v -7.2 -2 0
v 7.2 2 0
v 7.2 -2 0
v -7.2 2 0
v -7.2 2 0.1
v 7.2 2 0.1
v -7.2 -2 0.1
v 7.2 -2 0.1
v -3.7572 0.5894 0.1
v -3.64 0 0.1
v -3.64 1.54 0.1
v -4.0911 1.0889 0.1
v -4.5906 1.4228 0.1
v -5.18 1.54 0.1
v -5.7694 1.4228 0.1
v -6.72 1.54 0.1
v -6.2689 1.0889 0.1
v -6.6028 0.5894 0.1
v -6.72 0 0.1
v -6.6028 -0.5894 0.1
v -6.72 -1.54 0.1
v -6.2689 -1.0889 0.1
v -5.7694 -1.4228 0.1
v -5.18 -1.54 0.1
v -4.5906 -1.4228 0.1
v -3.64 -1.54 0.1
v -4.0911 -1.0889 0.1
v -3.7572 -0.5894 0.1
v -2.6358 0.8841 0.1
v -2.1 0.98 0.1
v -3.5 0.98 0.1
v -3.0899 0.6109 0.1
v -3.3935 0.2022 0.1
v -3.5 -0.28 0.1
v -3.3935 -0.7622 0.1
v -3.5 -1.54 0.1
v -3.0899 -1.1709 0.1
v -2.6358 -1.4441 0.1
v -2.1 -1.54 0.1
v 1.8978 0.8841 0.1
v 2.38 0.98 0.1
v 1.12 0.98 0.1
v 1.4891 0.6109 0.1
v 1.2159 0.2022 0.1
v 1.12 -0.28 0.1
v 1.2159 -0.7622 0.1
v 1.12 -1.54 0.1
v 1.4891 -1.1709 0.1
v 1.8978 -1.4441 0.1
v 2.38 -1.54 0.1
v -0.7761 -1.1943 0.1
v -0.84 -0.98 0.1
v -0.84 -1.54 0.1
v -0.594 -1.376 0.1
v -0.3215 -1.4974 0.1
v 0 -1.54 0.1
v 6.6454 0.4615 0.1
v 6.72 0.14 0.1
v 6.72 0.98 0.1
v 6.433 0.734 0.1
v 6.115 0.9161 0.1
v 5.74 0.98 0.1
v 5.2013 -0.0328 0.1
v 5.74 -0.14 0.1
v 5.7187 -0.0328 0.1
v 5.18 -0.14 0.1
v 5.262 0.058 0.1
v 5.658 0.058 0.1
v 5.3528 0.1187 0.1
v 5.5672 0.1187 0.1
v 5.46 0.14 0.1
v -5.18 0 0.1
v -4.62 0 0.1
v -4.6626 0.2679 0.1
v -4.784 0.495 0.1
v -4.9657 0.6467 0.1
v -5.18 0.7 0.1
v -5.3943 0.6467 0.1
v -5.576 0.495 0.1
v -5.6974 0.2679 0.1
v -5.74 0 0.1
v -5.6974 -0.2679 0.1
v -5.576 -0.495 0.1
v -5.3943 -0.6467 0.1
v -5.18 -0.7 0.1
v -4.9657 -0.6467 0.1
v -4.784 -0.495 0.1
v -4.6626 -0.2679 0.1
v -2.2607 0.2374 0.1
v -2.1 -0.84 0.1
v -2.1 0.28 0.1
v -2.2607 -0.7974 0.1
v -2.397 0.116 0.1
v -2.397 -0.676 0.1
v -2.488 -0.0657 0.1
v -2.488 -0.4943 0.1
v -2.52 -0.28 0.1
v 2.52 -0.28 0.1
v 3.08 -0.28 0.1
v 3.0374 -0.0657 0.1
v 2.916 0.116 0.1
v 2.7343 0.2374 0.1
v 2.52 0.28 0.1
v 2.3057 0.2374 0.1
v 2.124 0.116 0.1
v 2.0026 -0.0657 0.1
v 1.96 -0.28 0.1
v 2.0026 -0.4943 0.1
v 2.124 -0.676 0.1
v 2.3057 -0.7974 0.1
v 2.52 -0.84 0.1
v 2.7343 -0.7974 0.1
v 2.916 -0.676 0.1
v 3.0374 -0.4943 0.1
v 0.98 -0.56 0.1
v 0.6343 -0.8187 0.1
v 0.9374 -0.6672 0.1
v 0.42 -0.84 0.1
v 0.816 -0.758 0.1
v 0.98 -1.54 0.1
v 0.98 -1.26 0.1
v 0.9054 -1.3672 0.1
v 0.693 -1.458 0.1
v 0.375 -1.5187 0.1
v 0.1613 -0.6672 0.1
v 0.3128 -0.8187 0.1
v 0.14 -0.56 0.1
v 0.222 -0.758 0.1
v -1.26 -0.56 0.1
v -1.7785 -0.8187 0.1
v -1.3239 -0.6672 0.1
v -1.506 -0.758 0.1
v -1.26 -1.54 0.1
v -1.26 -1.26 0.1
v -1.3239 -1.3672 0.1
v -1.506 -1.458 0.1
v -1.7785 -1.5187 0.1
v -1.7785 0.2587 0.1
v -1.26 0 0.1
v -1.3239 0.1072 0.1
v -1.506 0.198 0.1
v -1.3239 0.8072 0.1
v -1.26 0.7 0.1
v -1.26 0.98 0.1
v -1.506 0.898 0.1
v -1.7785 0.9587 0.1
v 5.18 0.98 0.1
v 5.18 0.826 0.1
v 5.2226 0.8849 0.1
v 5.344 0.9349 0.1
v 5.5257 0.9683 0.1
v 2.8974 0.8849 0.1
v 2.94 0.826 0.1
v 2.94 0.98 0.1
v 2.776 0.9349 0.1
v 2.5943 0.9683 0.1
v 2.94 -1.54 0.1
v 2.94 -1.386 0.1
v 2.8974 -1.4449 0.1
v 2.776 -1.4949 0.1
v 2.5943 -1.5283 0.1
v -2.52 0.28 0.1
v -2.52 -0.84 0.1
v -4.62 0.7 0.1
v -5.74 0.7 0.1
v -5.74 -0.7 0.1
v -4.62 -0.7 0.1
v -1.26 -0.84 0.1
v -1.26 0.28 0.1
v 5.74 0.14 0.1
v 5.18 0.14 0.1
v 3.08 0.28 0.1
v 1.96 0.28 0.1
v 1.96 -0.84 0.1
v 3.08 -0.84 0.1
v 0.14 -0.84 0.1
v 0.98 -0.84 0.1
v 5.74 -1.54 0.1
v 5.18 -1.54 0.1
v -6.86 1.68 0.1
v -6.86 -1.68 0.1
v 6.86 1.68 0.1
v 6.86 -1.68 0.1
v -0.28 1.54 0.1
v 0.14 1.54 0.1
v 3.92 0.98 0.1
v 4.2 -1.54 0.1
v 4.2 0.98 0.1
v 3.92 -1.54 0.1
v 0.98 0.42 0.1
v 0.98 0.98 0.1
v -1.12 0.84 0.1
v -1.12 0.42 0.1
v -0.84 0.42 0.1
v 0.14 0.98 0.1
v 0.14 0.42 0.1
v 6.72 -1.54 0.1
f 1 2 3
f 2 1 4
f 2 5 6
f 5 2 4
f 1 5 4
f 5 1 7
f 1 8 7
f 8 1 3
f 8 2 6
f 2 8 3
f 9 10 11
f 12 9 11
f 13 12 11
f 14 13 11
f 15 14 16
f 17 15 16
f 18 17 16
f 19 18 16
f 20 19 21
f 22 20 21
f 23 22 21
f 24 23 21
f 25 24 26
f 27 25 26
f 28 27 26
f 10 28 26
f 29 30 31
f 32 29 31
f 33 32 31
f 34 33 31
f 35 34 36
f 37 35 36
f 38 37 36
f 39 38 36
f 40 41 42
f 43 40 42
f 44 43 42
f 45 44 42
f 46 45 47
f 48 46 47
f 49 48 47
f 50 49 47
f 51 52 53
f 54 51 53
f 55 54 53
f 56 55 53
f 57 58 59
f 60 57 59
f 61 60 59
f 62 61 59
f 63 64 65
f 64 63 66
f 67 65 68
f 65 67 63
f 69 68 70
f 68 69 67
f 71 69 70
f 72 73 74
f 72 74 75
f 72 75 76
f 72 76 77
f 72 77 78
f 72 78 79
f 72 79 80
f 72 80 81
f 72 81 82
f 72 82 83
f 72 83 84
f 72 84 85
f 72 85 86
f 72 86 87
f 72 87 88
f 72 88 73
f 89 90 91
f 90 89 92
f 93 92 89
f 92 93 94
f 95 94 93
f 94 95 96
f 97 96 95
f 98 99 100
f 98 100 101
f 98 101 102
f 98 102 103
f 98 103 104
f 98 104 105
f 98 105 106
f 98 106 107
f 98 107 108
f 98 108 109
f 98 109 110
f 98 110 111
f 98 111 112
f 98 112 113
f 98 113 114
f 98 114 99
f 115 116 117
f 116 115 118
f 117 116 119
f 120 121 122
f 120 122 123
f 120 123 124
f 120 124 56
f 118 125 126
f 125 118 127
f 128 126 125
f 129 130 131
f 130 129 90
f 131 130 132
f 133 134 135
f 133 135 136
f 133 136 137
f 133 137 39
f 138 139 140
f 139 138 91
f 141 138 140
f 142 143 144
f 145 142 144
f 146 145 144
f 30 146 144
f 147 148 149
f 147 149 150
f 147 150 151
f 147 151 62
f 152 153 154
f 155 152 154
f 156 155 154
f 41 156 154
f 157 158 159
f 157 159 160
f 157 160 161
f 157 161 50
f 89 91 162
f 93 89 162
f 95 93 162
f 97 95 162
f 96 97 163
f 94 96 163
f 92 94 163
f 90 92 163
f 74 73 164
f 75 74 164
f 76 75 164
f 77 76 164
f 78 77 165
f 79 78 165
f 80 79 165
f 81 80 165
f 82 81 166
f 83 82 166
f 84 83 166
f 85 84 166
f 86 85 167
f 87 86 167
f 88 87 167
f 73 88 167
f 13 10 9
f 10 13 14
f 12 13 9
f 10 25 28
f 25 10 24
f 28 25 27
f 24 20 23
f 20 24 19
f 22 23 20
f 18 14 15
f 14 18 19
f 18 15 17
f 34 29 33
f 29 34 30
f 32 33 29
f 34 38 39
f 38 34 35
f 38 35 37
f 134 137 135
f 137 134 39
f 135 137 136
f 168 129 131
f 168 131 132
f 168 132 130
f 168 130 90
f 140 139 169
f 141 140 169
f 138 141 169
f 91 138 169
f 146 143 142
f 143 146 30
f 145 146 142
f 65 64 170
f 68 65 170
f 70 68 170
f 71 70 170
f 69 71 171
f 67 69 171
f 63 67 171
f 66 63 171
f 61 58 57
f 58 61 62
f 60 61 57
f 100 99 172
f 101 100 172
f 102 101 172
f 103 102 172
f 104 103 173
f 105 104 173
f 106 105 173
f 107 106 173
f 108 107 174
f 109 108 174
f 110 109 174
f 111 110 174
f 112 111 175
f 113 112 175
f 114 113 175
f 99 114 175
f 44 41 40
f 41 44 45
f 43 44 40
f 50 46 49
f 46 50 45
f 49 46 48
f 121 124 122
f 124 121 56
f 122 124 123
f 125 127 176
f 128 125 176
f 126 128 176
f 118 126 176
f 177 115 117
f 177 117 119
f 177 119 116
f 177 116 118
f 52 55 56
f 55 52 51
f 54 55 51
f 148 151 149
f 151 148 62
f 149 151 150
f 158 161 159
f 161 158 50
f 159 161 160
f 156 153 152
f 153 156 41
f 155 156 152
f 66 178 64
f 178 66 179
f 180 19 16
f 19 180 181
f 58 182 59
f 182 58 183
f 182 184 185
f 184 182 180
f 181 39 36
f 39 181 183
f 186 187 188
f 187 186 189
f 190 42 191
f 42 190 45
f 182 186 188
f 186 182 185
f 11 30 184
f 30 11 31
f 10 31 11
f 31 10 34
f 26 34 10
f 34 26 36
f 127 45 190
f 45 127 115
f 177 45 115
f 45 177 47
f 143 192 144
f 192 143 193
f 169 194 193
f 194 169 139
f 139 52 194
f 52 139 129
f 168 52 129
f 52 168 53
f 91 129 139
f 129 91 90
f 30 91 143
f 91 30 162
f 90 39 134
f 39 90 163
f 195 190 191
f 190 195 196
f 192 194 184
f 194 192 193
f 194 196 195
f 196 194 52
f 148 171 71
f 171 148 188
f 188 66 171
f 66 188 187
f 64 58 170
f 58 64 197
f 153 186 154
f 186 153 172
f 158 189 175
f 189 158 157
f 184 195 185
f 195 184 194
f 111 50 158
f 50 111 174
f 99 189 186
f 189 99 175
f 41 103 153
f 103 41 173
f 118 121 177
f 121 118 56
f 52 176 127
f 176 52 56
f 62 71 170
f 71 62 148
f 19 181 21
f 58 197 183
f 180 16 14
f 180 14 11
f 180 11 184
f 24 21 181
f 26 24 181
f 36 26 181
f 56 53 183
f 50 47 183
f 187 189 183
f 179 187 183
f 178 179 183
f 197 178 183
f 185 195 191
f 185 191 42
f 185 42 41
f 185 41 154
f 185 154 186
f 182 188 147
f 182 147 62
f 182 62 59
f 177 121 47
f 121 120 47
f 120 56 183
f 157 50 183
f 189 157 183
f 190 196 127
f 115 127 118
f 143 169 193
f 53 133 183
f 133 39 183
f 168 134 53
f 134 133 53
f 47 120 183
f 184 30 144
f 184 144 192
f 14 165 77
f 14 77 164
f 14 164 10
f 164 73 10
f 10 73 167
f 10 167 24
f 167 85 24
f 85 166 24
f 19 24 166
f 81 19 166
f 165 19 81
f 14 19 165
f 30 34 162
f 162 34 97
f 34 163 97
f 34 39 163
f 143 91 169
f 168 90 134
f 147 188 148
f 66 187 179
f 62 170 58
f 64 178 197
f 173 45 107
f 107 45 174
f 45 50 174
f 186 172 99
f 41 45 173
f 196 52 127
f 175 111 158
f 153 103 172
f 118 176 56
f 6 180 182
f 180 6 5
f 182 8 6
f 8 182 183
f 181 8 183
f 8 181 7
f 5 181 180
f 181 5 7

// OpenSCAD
use <../lib.scad>
use <../p/box5-12.scad>
use <../p/logo-octantext2.scad>
$fa=1; $fs=0.2;
function ldraw_lib__165495c(realsolid=false) = [
// 0 Sticker  0.5 x  1.8 with Octan Logo without Border on Transparent Background
// 0 Name: 165495c.dat
// 0 Author: Takeshi Takahashi [RainbowDolphin]
// 0 !LDRAW_ORG Part UPDATE 2022-05
// 0 !LICENSE Licensed under CC BY 2.0 and CC BY 4.0 : see CAreadme.txt
// 
// 0 BFC CERTIFY CCW
  [0,"BFC","CERTIFY"],
  [0,"BFC","CCW"],
// 
// 0 !KEYWORDS Bricklink 6397stk01, Bricklink 6472stk01, Brickowl 258553, Gas pump
// 0 !KEYWORDS Rebrickable 165495, Service station, Set 6397, Set 6472
// 
// 0 !HISTORY 2022-09-15 [PTadmin] Official Update 2022-05
// 
// 
// 1 16 0 -0.25 0 18 0 0 0 0.25 0 0 0 5 box5-12.dat
  [1,16,0,-0.25,0,18,0,0,0,0.25,0,0,0,5, ldraw_lib__box5_12(realsolid)],
// 
// 0 BFC NOCLIP
  [0,"BFC","NOCLIP"],
// 1 16 0 -.25 -.35 .7 0 0 0 1 0 0 0 .7 logo-octantext2.dat
  [1,16,0,-.25,-.35,.7,0,0,0,1,0,0,0,.7, ldraw_lib__logo_octantext2(realsolid)],
// 0 BFC CLIP
  [0,"BFC","CLIP"],
// 
// 4 16 17.15 -.25 4.2 18 -.25 5 -18 -.25 5 -17.15 -.25 4.2
  [4,16,17.15,-.25,4.2,18,-.25,5,-18,-.25,5,-17.15,-.25,4.2],
// 4 16 18 -.25 -5 18 -.25 5 17.15 -.25 4.2 17.15 -.25 -4.2
  [4,16,18,-.25,-5,18,-.25,5,17.15,-.25,4.2,17.15,-.25,-4.2],
// 4 16 -18 -.25 -5 18 -.25 -5 17.15 -.25 -4.2 -17.15 -.25 -4.2
  [4,16,-18,-.25,-5,18,-.25,-5,17.15,-.25,-4.2,-17.15,-.25,-4.2],
// 4 16 -18 -.25 -5 -17.15 -.25 -4.2 -17.15 -.25 4.2 -18 -.25 5
  [4,16,-18,-.25,-5,-17.15,-.25,-4.2,-17.15,-.25,4.2,-18,-.25,5],
];
module ldraw_lib__165495c(step=0, col=false, unit=2/5, alt=false, line=0.2, solid=!$preview)
    makepoly(ldraw_lib__165495c(solid), step=step, col=col, unit=unit, alt=alt, line=line, solid=solid);
ldraw_lib__165495c(line=0.2);
